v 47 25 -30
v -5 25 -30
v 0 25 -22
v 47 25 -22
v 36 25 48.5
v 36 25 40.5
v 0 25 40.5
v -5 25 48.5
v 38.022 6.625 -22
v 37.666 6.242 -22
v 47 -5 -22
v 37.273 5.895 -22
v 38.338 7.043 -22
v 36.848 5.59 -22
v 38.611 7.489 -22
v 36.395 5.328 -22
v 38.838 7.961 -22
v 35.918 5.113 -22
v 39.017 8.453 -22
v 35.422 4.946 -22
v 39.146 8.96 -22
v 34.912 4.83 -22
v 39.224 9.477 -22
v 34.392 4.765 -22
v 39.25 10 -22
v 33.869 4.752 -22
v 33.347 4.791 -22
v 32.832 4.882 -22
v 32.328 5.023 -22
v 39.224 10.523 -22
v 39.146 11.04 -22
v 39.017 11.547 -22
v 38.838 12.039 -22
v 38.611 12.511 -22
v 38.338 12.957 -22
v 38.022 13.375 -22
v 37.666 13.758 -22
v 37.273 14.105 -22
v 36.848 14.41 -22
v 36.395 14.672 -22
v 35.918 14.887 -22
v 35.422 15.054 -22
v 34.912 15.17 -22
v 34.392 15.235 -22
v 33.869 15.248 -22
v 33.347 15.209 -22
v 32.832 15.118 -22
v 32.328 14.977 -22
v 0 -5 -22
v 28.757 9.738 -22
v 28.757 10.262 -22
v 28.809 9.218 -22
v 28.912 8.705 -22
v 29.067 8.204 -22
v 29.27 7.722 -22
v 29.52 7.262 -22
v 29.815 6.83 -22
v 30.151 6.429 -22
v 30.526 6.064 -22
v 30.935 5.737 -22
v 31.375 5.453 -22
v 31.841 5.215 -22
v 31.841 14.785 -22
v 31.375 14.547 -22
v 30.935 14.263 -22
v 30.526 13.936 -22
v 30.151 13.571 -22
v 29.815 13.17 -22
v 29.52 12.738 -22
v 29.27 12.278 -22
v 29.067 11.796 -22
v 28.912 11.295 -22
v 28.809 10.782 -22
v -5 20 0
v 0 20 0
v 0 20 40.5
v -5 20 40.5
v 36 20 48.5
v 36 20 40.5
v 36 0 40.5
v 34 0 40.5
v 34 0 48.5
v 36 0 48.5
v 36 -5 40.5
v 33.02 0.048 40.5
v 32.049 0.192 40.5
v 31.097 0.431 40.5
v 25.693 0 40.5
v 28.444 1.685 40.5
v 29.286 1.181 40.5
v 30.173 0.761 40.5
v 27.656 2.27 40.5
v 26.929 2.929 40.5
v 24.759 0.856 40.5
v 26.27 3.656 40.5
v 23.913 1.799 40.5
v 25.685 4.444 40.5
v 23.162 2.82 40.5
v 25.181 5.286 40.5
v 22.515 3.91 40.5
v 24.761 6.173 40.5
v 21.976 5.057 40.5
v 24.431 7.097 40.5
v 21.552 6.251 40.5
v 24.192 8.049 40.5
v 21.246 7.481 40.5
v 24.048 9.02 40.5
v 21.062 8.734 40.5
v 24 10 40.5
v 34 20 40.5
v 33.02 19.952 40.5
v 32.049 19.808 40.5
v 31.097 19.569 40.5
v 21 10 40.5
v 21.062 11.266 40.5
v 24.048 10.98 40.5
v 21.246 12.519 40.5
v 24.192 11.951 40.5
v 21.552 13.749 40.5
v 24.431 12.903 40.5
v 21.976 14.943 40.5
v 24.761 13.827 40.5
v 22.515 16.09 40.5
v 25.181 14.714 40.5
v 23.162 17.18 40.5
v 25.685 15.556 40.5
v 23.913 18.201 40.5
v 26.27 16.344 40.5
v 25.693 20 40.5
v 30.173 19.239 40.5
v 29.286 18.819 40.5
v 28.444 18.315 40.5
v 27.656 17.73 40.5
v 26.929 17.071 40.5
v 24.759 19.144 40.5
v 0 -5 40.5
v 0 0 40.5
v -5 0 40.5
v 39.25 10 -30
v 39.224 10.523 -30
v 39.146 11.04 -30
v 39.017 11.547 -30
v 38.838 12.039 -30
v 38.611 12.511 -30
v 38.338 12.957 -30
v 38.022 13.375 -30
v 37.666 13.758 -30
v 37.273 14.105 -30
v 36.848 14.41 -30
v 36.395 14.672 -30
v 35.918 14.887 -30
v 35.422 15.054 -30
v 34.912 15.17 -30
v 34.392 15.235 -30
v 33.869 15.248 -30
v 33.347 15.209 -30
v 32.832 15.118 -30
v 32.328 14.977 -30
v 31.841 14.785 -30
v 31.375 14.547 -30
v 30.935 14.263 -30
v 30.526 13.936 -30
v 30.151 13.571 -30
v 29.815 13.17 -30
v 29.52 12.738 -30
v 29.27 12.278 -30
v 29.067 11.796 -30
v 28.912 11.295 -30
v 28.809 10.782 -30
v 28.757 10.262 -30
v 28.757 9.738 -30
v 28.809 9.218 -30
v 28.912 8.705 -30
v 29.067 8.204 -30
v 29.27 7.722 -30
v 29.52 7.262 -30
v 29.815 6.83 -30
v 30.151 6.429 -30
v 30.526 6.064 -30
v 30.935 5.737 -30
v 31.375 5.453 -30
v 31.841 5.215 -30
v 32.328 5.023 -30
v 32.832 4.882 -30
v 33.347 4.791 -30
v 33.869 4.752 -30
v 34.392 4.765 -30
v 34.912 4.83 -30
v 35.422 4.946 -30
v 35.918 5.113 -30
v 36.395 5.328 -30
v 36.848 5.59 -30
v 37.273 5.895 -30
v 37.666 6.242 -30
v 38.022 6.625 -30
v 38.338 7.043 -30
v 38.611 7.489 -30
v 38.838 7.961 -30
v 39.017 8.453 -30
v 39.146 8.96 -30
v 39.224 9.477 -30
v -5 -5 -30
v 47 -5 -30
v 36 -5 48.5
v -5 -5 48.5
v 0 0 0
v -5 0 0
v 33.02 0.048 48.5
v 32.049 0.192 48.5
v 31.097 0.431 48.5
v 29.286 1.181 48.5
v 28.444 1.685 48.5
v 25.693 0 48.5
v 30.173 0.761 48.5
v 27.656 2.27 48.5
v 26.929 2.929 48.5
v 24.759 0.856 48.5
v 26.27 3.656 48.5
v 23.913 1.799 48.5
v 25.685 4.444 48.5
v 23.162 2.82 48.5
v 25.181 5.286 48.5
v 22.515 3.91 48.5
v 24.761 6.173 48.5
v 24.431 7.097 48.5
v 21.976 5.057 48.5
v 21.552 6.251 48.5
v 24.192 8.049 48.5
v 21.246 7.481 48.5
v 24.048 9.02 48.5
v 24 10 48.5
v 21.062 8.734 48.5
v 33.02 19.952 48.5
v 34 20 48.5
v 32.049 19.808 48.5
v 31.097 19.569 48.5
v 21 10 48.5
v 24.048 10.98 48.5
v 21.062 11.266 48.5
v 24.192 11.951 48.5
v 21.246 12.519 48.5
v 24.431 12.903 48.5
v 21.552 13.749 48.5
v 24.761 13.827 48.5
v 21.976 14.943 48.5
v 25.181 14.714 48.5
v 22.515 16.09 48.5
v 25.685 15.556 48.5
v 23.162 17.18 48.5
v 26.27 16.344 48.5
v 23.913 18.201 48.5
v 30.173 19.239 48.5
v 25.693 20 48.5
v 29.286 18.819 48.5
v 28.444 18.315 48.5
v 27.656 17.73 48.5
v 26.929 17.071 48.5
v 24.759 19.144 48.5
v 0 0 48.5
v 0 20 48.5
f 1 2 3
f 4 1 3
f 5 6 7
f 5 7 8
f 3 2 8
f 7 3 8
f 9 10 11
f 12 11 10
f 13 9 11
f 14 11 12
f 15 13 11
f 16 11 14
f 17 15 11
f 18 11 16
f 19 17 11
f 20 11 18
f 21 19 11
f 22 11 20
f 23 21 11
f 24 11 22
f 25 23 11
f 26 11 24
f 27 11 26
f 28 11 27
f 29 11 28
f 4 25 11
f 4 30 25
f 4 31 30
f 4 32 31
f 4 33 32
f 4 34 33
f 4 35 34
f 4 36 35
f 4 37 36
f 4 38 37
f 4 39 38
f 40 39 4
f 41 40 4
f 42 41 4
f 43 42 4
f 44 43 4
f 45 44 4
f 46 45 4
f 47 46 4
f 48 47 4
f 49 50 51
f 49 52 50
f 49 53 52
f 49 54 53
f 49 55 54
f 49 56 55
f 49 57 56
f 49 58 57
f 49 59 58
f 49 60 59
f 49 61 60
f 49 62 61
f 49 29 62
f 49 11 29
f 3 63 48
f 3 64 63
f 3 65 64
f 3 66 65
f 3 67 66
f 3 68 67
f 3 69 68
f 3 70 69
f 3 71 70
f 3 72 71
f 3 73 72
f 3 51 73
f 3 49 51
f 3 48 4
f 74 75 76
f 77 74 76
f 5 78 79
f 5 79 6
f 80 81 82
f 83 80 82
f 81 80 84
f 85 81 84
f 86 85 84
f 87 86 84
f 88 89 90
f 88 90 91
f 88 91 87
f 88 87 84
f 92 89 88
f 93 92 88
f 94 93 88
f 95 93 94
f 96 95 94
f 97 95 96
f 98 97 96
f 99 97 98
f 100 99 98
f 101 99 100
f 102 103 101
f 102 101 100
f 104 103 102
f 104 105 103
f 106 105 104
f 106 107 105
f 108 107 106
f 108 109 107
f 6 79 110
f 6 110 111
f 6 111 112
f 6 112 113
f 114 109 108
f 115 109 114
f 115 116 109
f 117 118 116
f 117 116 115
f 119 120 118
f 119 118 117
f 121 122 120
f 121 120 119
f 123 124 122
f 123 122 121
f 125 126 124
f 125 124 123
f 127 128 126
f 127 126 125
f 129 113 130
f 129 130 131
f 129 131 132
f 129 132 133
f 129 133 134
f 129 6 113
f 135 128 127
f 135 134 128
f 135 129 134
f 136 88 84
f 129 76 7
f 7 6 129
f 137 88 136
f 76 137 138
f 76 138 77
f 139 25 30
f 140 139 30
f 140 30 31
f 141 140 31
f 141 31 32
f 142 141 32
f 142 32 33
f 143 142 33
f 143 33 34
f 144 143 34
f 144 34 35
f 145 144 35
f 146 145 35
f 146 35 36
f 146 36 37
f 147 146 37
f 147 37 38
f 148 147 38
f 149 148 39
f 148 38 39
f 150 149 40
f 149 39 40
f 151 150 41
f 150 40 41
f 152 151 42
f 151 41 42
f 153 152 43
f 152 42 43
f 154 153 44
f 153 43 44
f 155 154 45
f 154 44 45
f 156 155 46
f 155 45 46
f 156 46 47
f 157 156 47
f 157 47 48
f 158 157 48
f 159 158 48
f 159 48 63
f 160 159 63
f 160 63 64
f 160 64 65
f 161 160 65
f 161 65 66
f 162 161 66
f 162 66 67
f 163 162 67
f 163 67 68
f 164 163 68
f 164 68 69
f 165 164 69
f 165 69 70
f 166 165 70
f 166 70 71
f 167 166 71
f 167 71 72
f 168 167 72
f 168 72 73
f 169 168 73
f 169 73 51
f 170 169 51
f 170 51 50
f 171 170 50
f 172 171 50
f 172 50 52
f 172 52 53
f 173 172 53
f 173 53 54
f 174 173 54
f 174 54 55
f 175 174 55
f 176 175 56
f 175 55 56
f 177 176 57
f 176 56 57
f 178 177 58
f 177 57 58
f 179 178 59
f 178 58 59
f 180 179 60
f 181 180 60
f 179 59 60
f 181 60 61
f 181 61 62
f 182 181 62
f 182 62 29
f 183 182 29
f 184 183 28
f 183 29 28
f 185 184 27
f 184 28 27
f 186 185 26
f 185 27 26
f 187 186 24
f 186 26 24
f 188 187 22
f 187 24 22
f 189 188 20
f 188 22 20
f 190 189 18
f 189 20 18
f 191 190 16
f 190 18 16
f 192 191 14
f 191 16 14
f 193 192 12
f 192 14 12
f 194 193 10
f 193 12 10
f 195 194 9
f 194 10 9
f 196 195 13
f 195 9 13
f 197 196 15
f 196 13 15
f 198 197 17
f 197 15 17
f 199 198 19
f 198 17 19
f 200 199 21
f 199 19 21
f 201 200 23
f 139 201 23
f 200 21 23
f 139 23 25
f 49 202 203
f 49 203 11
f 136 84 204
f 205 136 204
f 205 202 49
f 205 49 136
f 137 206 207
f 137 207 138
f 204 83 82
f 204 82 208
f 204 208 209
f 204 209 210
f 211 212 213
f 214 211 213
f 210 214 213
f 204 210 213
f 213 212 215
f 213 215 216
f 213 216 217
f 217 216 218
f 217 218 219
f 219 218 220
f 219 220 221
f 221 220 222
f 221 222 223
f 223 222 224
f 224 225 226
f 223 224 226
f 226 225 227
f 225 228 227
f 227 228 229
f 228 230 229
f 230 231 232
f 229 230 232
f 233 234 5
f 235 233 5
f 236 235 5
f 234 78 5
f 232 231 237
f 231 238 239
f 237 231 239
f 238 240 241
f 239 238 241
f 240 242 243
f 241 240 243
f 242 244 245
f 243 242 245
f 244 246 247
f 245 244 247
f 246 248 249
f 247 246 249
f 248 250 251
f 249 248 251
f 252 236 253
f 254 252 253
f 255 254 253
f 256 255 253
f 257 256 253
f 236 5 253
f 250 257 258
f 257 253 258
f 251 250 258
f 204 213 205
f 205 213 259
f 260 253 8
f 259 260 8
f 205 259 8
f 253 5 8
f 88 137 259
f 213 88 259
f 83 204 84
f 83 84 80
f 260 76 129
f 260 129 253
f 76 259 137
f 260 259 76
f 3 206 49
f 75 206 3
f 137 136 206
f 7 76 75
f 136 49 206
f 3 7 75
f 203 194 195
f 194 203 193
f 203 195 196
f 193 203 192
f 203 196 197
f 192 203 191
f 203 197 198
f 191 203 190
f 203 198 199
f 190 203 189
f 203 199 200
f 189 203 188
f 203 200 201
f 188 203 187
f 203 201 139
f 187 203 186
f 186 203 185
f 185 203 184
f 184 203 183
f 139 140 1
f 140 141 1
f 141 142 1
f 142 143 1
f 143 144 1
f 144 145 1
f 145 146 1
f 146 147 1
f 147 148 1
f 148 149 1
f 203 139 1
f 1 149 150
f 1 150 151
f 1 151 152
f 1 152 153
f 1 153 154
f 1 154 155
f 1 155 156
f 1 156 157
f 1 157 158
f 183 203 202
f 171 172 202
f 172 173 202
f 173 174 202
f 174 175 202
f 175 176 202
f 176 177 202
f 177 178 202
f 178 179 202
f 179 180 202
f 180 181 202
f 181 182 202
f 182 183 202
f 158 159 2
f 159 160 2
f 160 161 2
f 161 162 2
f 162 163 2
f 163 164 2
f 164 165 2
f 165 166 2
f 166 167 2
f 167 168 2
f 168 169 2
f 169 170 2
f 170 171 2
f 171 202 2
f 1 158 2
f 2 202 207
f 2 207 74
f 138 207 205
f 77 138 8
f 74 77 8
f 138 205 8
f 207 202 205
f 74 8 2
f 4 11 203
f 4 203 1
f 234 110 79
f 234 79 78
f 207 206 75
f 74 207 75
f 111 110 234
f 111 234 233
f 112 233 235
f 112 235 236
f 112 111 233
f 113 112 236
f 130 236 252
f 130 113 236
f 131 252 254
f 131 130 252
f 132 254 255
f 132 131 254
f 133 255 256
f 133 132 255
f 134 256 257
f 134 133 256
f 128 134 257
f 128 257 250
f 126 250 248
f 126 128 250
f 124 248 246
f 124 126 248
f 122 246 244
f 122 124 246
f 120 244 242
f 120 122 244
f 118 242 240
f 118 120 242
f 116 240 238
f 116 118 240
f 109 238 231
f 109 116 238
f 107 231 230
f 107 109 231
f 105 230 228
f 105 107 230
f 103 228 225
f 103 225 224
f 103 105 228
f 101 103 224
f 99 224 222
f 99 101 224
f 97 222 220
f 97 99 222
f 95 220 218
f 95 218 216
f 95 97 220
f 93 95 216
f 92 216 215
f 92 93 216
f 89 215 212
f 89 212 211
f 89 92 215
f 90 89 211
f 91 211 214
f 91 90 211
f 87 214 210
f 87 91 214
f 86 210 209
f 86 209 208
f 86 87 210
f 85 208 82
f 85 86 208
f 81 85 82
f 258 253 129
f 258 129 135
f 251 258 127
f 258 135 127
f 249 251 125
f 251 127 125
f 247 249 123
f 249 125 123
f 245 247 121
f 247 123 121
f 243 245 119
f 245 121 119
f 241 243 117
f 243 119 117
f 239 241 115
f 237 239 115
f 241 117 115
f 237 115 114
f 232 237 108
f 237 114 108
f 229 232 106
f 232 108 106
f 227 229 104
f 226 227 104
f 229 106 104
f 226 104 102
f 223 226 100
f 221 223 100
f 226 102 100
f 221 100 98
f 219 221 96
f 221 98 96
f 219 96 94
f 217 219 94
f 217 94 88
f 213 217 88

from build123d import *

# Parameters (mm, degrees)
SKETCH011_W     = 30
SKETCH011_H     = 78.5
SKETCH011_W_2   = 20
SKETCH011_H_2   = 40.5
PAD009_DEPTH    = 5
SKETCH008_W     = 30
SKETCH008_H     = 8
PAD008_DEPTH    = 47
SKETCH009_W     = 5
SKETCH009_H     = 8
PAD012_DEPTH    = 36
PAD010_DEPTH    = 8
SKETCH012_R     = 1.5
POCKET004_DEPTH = 6.501
SKETCH015_R     = 5.25
POCKET003_DEPTH = 30.001


with BuildPart() as part:
    # Sketch011 → Pad009 (new body)
    with BuildSketch(Plane.YZ):
        with Locations((10, 9.25)):
            Rectangle(SKETCH011_W, SKETCH011_H)
        with Locations((10, 20.25)):
            Rectangle(SKETCH011_W_2, SKETCH011_H_2, mode=Mode.SUBTRACT)
    extrude(amount=-PAD009_DEPTH)

    # Sketch008 → Pad008 (join)
    with BuildSketch(Plane.YZ):
        with Locations((10, -26)):
            Rectangle(SKETCH008_W, SKETCH008_H)
    extrude(amount=PAD008_DEPTH)

    # Sketch009 → Pad012 (join)
    with BuildSketch(Plane.YZ):
        with Locations((-2.5, 44.5)):
            Rectangle(SKETCH009_W, SKETCH009_H)
        with Locations((22.5, 44.5)):
            Rectangle(SKETCH009_W, SKETCH009_H)
    extrude(amount=PAD012_DEPTH)

    # Sketch010 → Pad010 (join)
    with BuildSketch(Plane.XY.offset(40.5)):
        with BuildLine():
            ThreePointArc((34, 20), (24, 10), (34, 0))
            Line((34, 0), (34, -5))
            Line((34, -5), (31, -5))
            Line((31, -5), (31, -2.649111))
            ThreePointArc((31, 22.649111), (21, 10), (31, -2.649111))
            Line((31, 25), (31, 22.649111))
            Line((34, 25), (31, 25))
            Line((34, 20), (34, 25))
        make_face()
    extrude(amount=PAD010_DEPTH)

    # Sketch012 → Pocket004 (cut, through all)
    with BuildSketch(Plane.YZ.offset(40.5)):
        with Locations((-2.5, 44.5)):
            Circle(SKETCH012_R)
        with Locations((22.5, 44.5)):
            Circle(SKETCH012_R)
    extrude(amount=POCKET004_DEPTH, mode=Mode.SUBTRACT)

    # Sketch015 → Pocket003 (cut, through all)
    with BuildSketch(Plane.XY):
        with Locations((34, 10)):
            Circle(SKETCH015_R)
    extrude(amount=-POCKET003_DEPTH, mode=Mode.SUBTRACT)


solid = part.part
